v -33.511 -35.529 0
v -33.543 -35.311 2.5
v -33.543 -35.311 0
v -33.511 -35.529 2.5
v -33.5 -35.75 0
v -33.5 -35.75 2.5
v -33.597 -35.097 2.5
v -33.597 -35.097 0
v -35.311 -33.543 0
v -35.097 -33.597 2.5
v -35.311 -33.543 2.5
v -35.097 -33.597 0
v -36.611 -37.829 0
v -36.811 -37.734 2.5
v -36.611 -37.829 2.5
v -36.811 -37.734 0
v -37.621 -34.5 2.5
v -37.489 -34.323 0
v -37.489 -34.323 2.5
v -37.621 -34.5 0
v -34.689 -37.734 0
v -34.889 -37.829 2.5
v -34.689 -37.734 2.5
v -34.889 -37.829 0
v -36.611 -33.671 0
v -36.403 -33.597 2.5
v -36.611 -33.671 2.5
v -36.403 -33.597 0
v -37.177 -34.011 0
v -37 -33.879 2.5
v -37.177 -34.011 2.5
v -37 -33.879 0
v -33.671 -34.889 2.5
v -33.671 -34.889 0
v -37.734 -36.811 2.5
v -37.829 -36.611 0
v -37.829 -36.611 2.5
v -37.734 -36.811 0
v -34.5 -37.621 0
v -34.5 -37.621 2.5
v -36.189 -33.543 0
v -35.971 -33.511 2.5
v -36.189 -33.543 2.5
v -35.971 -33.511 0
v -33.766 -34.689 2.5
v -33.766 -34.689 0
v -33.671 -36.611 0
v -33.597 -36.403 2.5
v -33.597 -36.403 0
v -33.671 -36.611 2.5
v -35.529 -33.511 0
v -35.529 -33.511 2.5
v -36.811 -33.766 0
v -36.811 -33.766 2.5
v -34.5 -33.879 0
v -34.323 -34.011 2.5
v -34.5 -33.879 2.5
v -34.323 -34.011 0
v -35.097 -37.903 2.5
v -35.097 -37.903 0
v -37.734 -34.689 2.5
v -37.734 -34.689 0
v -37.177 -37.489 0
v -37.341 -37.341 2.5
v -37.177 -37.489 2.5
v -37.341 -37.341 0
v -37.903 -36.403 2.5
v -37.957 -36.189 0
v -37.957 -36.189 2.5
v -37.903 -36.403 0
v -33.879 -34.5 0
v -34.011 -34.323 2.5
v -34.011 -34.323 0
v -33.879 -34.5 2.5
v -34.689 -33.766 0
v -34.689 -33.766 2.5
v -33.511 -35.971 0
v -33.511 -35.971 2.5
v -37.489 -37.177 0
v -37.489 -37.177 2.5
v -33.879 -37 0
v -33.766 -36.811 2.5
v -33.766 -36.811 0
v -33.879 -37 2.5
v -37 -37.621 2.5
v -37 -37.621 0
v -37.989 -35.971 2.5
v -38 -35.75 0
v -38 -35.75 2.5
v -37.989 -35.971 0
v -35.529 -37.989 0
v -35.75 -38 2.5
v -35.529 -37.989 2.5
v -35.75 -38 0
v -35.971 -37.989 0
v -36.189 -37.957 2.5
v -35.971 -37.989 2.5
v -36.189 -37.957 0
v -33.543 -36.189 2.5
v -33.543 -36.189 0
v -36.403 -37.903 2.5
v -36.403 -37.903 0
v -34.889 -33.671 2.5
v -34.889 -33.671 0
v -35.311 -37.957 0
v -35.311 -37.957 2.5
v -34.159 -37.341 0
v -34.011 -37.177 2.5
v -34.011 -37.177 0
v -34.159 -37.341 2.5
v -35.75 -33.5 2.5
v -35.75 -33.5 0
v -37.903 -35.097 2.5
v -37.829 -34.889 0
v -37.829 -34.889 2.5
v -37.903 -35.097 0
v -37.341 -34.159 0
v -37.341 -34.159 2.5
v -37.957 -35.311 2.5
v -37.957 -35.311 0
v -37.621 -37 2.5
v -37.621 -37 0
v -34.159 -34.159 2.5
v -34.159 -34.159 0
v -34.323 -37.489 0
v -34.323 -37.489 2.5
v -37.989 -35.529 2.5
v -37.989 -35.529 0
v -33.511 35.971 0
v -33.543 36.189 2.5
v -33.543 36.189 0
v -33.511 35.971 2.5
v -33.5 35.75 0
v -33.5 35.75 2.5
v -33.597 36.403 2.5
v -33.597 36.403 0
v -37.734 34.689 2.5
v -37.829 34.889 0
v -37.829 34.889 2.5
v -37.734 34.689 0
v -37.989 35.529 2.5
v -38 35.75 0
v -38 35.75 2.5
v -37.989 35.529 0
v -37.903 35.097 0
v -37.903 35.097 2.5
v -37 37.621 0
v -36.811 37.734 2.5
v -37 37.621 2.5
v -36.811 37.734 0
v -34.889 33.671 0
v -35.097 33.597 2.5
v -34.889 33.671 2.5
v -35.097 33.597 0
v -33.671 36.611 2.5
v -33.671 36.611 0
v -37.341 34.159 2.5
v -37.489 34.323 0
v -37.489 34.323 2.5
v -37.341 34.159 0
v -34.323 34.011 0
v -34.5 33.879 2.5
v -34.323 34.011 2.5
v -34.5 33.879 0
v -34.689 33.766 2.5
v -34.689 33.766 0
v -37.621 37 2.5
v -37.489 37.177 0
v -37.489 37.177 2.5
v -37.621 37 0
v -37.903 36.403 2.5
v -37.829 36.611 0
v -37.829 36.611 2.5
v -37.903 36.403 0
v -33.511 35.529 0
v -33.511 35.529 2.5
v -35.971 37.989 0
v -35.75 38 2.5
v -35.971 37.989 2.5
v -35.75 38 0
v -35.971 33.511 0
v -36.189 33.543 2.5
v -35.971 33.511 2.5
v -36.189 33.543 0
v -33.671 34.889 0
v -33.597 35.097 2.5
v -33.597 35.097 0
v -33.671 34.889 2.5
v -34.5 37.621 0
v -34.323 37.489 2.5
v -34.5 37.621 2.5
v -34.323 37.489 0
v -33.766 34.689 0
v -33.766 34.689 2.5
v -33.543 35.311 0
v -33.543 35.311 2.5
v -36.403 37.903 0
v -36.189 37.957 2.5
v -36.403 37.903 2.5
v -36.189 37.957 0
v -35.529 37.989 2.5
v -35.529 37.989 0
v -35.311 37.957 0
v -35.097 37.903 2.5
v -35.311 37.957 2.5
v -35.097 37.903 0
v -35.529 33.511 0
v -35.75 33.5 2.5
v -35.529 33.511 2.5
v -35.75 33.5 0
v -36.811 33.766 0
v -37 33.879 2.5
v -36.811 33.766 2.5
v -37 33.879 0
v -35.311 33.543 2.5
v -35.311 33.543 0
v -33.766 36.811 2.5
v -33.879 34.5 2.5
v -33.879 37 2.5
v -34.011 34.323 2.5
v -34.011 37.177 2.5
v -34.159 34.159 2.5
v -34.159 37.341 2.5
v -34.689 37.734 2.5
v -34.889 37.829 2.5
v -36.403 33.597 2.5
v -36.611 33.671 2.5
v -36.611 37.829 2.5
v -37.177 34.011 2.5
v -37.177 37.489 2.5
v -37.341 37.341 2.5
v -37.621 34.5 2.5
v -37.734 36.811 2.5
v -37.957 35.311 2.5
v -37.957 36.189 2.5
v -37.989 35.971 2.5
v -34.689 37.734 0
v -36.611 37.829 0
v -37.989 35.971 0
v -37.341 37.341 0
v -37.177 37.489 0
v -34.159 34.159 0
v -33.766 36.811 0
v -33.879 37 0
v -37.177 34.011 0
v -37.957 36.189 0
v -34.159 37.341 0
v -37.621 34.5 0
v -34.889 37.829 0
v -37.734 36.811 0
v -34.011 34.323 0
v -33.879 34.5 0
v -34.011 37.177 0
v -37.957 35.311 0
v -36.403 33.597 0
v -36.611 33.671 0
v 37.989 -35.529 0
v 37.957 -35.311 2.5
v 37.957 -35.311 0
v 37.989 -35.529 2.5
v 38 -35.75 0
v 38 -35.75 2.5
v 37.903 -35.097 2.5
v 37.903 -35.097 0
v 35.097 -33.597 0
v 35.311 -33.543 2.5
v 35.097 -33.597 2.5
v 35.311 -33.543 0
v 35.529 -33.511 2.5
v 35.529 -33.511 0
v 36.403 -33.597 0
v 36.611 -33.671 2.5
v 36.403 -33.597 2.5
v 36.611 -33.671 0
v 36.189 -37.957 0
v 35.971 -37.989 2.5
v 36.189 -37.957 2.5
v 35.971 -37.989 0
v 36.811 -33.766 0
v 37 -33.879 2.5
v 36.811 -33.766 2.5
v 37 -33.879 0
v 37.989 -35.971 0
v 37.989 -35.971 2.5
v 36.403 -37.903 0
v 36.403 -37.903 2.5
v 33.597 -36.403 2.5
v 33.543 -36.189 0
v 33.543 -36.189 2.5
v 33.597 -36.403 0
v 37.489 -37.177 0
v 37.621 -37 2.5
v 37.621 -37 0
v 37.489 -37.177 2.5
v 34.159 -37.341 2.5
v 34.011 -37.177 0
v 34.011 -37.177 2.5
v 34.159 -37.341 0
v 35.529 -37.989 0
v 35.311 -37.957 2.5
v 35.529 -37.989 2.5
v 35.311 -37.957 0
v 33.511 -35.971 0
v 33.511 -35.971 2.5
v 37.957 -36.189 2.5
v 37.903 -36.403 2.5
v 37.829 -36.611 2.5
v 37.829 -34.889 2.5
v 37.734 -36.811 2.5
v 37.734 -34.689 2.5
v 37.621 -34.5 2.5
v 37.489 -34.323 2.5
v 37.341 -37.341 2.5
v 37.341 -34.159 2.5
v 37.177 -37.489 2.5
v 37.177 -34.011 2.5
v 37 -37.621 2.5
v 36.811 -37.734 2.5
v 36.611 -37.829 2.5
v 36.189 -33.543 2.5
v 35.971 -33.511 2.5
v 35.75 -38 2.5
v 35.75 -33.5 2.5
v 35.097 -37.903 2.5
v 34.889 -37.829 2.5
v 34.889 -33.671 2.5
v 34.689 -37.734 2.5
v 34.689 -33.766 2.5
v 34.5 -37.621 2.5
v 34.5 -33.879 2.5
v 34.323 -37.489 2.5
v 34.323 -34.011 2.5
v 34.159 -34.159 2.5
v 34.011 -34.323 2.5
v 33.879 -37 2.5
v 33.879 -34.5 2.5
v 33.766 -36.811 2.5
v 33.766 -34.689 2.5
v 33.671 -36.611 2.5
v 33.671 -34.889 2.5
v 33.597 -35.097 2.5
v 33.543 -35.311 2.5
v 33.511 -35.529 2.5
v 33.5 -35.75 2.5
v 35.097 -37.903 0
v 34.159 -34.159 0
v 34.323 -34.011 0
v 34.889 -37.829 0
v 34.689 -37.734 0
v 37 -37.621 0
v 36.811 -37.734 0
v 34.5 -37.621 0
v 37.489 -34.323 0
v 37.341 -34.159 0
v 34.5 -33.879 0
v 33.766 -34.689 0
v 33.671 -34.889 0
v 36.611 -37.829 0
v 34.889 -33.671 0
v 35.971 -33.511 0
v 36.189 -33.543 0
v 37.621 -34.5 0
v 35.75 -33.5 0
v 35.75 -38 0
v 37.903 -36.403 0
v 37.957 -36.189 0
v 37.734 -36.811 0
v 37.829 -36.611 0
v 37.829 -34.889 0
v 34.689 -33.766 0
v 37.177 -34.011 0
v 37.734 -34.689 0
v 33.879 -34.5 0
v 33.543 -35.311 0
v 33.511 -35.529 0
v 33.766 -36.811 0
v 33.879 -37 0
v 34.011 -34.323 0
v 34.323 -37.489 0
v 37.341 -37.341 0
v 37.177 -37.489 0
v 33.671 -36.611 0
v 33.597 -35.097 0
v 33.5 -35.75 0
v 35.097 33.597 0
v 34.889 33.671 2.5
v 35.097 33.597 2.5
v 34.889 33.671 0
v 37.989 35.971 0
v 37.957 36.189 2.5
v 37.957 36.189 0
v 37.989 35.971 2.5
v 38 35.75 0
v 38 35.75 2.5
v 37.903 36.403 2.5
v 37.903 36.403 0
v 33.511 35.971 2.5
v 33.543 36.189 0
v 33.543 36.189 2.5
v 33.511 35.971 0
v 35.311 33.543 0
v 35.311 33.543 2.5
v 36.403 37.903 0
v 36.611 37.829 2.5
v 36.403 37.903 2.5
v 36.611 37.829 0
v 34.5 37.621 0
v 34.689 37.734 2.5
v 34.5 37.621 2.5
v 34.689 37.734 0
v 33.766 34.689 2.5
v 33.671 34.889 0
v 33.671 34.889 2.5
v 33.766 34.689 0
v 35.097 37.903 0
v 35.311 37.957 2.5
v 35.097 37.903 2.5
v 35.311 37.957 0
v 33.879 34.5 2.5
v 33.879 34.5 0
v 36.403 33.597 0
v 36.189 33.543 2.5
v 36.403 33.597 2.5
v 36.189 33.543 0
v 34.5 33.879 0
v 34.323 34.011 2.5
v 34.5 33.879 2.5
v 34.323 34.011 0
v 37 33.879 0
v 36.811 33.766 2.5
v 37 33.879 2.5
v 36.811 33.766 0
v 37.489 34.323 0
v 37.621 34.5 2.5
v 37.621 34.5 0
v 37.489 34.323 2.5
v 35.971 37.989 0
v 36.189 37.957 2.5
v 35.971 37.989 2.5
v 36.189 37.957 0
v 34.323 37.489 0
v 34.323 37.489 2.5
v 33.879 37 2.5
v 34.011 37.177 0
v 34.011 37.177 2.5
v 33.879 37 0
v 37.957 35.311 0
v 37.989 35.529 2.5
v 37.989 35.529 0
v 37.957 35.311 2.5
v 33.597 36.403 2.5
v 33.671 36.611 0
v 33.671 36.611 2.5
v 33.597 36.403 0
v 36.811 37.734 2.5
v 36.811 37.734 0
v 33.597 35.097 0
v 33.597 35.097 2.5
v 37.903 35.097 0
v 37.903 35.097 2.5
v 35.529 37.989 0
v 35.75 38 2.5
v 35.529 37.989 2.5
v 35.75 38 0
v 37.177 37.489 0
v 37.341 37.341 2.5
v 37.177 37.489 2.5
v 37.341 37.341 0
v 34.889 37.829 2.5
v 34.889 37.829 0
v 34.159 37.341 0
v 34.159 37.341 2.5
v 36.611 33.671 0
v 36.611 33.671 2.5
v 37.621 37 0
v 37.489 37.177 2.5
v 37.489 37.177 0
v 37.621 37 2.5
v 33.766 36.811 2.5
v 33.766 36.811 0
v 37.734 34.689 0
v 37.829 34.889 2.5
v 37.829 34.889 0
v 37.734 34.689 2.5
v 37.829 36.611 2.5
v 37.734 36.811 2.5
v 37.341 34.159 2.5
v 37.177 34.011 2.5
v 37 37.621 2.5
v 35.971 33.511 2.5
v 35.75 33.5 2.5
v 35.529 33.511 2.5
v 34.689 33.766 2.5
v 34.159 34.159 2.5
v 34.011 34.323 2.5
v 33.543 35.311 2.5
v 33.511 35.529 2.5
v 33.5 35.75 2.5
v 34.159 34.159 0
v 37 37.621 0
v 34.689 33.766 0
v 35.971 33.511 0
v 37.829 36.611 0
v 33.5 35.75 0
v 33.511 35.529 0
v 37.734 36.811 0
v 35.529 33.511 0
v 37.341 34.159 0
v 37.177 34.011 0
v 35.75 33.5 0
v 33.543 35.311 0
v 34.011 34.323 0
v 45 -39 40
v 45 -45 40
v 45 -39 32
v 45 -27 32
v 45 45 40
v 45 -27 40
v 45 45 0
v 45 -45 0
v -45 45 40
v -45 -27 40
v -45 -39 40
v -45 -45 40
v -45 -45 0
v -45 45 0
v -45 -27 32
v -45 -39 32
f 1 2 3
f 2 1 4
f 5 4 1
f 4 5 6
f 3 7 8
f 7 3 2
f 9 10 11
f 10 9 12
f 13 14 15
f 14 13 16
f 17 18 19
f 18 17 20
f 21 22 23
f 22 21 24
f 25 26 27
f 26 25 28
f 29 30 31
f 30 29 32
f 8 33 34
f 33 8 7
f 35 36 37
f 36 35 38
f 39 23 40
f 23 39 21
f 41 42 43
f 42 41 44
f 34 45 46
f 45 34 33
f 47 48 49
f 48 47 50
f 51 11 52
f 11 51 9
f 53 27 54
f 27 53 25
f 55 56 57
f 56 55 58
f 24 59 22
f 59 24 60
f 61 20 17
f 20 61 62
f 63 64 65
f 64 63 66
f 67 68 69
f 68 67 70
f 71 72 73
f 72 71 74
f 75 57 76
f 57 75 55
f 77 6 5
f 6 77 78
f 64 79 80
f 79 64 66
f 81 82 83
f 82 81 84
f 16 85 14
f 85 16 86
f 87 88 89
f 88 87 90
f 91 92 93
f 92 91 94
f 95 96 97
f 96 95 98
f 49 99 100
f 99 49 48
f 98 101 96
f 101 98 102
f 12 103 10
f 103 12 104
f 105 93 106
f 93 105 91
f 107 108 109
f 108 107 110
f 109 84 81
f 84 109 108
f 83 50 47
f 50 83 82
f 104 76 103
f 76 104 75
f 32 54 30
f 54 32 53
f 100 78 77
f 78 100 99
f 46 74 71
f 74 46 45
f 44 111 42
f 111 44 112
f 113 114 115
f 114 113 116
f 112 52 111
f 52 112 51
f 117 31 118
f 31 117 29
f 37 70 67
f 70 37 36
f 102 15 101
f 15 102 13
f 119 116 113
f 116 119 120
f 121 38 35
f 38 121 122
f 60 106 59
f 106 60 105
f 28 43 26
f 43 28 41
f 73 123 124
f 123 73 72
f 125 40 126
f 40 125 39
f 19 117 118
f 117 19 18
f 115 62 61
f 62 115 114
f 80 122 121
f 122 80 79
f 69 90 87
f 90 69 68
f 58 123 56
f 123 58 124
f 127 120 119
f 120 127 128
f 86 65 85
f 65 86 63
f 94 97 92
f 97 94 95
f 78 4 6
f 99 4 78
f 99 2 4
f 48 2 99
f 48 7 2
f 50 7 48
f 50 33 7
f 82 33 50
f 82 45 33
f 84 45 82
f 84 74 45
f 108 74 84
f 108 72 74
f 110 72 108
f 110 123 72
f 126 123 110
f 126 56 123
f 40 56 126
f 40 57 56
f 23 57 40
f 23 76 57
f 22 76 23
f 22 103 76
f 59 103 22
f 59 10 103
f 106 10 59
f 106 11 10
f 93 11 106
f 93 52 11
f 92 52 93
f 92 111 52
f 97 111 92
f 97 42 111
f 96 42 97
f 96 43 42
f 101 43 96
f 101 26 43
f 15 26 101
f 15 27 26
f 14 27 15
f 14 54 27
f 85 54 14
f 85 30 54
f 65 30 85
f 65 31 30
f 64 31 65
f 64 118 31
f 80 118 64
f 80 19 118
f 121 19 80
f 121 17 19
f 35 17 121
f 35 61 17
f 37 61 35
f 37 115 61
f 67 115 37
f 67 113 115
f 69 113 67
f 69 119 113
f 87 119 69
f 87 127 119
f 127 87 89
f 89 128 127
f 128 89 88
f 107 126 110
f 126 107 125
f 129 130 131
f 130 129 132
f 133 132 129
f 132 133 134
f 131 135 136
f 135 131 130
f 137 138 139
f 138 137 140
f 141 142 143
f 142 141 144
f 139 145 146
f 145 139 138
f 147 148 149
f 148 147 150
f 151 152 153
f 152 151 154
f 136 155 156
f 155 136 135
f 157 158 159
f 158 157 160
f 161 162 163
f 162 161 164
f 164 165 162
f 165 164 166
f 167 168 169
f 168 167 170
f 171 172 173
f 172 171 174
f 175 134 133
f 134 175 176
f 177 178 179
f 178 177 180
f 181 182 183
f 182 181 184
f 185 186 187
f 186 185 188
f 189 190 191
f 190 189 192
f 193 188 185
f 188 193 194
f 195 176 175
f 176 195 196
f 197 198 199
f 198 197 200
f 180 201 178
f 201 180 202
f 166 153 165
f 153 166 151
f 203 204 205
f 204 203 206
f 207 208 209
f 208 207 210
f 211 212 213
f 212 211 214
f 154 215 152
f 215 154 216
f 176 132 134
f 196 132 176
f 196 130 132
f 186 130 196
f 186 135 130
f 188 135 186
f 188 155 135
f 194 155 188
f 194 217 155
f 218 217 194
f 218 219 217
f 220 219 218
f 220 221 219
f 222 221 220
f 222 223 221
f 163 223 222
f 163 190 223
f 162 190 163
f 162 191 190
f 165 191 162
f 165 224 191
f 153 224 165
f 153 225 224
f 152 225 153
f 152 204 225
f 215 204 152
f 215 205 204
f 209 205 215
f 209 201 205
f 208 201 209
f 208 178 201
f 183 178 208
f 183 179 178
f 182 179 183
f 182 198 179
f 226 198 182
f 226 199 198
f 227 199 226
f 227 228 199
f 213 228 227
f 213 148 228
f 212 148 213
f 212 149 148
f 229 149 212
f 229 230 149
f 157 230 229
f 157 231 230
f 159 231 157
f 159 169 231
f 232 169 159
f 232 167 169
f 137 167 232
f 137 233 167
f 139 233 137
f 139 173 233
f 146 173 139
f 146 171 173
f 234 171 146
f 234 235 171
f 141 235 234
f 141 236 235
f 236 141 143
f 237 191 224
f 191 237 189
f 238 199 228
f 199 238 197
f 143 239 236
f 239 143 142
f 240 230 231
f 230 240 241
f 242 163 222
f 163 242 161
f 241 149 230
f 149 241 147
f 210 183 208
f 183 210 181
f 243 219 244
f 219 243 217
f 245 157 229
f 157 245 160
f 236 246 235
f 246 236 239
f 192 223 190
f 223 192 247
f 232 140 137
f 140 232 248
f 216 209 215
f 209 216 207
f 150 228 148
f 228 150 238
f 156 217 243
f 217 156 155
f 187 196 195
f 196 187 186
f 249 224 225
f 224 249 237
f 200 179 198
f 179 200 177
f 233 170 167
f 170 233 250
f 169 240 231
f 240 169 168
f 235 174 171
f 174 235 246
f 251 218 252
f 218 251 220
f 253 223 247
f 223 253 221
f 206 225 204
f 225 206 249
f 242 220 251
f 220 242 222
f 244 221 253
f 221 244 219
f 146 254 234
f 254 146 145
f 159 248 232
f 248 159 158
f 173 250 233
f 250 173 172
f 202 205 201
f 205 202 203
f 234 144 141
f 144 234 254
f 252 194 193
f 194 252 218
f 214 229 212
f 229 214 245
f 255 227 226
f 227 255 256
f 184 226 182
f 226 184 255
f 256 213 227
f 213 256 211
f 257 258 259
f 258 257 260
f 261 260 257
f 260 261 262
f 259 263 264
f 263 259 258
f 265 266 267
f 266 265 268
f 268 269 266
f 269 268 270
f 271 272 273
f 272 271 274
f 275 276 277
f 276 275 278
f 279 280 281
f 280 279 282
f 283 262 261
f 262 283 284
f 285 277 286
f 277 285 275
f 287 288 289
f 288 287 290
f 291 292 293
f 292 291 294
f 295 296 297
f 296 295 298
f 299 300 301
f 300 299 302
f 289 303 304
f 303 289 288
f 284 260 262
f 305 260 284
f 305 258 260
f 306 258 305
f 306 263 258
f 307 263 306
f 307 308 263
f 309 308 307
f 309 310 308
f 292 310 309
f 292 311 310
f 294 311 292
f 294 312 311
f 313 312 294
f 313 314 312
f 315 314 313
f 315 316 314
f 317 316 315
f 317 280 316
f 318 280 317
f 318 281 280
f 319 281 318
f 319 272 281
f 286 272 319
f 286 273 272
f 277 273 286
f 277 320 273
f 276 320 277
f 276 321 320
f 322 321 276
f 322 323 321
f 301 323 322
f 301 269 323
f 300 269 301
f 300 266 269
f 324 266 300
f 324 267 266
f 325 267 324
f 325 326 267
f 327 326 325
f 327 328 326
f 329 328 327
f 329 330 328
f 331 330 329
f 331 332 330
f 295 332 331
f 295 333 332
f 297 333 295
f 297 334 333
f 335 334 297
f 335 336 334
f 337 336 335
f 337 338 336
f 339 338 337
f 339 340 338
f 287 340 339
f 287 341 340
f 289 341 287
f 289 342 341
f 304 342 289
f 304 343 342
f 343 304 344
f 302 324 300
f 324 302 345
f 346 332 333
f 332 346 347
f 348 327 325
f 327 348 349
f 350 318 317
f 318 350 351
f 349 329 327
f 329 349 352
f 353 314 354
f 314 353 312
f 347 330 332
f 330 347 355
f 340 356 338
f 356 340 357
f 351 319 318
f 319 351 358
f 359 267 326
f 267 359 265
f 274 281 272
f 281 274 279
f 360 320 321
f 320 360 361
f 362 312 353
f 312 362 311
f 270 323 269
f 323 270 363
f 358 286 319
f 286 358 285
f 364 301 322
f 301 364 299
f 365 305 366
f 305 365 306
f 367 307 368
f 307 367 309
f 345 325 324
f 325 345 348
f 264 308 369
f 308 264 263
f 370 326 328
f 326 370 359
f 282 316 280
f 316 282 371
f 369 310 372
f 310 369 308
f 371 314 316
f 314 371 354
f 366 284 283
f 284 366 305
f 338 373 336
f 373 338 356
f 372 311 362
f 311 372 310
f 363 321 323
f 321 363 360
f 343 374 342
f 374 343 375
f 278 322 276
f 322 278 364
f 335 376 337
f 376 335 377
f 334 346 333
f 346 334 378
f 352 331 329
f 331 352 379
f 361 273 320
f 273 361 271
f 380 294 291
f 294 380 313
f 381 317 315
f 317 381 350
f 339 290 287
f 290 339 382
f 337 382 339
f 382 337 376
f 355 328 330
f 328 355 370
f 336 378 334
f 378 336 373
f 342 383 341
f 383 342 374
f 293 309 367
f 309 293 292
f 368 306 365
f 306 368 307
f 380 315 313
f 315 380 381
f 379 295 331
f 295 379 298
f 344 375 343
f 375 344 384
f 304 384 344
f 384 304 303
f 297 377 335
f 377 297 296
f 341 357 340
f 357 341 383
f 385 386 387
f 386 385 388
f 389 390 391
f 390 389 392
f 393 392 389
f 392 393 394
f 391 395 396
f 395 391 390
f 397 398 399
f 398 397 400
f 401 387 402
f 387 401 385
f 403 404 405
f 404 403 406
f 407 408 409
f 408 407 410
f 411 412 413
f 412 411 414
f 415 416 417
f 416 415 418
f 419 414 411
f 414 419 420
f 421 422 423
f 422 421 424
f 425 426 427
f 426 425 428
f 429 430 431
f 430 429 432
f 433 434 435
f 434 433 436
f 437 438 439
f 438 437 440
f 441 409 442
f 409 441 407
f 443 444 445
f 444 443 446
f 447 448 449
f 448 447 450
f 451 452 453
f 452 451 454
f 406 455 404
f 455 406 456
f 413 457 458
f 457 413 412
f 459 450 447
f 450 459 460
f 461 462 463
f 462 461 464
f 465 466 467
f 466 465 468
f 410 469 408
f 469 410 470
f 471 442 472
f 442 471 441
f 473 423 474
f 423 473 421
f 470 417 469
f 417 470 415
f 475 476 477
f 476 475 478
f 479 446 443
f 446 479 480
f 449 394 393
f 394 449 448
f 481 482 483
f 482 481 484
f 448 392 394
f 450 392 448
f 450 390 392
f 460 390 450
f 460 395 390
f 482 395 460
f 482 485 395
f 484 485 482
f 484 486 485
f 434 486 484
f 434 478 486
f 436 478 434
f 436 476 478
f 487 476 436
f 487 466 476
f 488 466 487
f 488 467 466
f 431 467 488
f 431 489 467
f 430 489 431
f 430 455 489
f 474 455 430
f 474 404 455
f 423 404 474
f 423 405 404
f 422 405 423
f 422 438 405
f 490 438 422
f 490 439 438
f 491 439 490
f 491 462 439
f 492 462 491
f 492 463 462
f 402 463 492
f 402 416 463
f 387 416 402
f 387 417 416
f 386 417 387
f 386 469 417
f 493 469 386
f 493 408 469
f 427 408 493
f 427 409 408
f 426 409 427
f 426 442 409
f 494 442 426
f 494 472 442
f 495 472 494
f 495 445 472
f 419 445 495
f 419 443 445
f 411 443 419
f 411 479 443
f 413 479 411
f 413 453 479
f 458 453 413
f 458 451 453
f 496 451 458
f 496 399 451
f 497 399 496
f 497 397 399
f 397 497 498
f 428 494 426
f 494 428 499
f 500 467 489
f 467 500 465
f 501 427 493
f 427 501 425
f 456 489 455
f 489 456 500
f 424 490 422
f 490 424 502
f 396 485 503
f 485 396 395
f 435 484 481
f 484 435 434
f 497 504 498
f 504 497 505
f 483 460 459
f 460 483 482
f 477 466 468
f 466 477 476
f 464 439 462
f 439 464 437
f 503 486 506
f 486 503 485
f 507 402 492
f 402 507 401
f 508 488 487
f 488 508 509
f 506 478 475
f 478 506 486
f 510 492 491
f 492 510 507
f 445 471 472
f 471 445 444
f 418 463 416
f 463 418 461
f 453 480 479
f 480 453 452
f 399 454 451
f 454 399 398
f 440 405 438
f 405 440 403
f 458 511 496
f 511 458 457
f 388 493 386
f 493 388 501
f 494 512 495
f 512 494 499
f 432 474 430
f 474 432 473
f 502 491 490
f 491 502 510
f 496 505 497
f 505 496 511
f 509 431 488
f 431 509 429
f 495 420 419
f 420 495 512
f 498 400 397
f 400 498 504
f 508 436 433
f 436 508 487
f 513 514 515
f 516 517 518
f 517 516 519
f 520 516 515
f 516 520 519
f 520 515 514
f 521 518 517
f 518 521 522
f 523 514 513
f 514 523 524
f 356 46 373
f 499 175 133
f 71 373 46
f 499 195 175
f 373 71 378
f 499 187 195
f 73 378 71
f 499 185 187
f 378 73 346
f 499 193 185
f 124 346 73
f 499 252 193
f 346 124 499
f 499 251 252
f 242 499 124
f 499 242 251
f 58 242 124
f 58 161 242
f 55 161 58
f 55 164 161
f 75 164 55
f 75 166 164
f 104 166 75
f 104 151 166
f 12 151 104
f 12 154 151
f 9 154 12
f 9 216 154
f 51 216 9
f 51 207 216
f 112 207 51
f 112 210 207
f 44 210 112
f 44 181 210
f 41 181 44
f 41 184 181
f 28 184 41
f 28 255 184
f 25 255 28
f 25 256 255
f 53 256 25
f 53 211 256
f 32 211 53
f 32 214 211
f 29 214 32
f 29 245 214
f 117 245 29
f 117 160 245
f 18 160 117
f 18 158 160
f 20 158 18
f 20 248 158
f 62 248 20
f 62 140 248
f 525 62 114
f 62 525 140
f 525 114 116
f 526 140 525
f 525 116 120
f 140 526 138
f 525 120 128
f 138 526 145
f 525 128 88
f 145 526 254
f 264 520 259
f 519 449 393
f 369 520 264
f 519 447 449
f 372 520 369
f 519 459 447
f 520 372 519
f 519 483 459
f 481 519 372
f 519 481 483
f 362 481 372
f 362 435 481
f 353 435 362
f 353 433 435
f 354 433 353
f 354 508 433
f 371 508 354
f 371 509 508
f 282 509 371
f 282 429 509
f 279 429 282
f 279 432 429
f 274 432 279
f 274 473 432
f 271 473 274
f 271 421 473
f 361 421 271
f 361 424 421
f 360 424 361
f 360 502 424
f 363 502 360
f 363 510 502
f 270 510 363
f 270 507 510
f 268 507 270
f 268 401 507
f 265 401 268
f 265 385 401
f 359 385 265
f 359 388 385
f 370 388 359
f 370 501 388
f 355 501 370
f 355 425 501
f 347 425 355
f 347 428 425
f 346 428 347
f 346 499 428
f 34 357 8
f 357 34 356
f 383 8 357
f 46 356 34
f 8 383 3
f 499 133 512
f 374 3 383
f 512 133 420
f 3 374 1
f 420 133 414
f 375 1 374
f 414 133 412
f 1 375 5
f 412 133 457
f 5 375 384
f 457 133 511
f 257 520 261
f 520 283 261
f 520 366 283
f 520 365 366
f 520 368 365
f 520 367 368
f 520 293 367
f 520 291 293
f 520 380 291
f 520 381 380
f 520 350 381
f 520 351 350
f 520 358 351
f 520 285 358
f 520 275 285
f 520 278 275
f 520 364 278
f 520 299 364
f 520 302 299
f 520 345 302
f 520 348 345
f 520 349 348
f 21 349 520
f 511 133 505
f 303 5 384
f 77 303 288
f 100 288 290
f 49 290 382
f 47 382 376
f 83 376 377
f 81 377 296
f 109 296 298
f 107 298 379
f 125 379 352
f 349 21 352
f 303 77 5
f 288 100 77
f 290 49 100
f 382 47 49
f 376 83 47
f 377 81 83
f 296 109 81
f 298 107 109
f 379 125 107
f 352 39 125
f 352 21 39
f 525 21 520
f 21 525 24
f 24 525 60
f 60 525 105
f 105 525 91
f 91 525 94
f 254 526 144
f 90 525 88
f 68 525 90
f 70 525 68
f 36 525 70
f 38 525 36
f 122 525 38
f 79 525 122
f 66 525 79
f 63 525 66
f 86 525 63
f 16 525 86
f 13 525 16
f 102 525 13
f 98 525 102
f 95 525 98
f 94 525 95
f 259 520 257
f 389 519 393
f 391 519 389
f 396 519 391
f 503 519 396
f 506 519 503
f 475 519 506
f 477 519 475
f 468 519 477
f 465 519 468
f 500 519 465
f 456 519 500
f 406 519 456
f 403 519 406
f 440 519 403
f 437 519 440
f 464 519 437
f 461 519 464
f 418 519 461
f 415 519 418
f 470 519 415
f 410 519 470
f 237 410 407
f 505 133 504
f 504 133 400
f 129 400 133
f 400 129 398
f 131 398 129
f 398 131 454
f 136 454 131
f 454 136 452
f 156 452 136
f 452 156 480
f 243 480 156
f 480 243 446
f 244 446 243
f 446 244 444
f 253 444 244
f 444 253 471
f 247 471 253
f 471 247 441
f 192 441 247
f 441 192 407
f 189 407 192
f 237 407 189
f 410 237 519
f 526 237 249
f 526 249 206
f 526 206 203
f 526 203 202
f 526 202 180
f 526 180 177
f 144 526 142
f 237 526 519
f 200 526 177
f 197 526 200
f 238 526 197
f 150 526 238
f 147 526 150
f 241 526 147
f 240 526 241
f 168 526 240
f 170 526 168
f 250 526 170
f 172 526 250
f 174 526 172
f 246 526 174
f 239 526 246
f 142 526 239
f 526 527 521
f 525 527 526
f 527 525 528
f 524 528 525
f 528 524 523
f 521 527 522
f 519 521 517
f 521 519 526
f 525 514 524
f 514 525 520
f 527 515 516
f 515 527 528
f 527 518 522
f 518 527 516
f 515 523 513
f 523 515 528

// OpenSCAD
// Magnetic stirrer housing for 80 mm PC case fan
// Print orientation: top plate on bed (z = 0), walls build upward (+Z)

// ---------- Dimensions ----------
plate_t      = 2;     // top plate thickness
wall_t       = 2.5;   // wall thickness
box_h        = 40;    // outer wall height (open top)
outer_x      = 90;    // outer size in X
outer_y      = 90;    // outer size in Y
hole_d       = 4.5;   // M4 screw hole diameter
hole_pitch   = 71.5;  // square pattern centre-to-centre
notch_w      = 12;    // cable notch width
notch_depth  = 8;     // notch depth from open edge (z = 32 to 40)
eps          = 0.5;   // cutter overshoot

$fn = 64;

// ---------- Model ----------
difference() {
    // Outer block
    translate([-outer_x/2, -outer_y/2, 0])
        cube([outer_x, outer_y, box_h]);

    // Screw holes through top plate
    for (sx = [-1, 1], sy = [-1, 1])
        translate([sx * hole_pitch/2, sy * hole_pitch/2, -eps])
            cylinder(d = hole_d, h = plate_t + 2*eps);

    // Cable notch in one wall (z = 32 to 40)
    translate([-outer_x/2, -outer_y/2 + notch_w/2, box_h - notch_depth])
        cube([outer_x, notch_w, notch_depth + eps]);
}
